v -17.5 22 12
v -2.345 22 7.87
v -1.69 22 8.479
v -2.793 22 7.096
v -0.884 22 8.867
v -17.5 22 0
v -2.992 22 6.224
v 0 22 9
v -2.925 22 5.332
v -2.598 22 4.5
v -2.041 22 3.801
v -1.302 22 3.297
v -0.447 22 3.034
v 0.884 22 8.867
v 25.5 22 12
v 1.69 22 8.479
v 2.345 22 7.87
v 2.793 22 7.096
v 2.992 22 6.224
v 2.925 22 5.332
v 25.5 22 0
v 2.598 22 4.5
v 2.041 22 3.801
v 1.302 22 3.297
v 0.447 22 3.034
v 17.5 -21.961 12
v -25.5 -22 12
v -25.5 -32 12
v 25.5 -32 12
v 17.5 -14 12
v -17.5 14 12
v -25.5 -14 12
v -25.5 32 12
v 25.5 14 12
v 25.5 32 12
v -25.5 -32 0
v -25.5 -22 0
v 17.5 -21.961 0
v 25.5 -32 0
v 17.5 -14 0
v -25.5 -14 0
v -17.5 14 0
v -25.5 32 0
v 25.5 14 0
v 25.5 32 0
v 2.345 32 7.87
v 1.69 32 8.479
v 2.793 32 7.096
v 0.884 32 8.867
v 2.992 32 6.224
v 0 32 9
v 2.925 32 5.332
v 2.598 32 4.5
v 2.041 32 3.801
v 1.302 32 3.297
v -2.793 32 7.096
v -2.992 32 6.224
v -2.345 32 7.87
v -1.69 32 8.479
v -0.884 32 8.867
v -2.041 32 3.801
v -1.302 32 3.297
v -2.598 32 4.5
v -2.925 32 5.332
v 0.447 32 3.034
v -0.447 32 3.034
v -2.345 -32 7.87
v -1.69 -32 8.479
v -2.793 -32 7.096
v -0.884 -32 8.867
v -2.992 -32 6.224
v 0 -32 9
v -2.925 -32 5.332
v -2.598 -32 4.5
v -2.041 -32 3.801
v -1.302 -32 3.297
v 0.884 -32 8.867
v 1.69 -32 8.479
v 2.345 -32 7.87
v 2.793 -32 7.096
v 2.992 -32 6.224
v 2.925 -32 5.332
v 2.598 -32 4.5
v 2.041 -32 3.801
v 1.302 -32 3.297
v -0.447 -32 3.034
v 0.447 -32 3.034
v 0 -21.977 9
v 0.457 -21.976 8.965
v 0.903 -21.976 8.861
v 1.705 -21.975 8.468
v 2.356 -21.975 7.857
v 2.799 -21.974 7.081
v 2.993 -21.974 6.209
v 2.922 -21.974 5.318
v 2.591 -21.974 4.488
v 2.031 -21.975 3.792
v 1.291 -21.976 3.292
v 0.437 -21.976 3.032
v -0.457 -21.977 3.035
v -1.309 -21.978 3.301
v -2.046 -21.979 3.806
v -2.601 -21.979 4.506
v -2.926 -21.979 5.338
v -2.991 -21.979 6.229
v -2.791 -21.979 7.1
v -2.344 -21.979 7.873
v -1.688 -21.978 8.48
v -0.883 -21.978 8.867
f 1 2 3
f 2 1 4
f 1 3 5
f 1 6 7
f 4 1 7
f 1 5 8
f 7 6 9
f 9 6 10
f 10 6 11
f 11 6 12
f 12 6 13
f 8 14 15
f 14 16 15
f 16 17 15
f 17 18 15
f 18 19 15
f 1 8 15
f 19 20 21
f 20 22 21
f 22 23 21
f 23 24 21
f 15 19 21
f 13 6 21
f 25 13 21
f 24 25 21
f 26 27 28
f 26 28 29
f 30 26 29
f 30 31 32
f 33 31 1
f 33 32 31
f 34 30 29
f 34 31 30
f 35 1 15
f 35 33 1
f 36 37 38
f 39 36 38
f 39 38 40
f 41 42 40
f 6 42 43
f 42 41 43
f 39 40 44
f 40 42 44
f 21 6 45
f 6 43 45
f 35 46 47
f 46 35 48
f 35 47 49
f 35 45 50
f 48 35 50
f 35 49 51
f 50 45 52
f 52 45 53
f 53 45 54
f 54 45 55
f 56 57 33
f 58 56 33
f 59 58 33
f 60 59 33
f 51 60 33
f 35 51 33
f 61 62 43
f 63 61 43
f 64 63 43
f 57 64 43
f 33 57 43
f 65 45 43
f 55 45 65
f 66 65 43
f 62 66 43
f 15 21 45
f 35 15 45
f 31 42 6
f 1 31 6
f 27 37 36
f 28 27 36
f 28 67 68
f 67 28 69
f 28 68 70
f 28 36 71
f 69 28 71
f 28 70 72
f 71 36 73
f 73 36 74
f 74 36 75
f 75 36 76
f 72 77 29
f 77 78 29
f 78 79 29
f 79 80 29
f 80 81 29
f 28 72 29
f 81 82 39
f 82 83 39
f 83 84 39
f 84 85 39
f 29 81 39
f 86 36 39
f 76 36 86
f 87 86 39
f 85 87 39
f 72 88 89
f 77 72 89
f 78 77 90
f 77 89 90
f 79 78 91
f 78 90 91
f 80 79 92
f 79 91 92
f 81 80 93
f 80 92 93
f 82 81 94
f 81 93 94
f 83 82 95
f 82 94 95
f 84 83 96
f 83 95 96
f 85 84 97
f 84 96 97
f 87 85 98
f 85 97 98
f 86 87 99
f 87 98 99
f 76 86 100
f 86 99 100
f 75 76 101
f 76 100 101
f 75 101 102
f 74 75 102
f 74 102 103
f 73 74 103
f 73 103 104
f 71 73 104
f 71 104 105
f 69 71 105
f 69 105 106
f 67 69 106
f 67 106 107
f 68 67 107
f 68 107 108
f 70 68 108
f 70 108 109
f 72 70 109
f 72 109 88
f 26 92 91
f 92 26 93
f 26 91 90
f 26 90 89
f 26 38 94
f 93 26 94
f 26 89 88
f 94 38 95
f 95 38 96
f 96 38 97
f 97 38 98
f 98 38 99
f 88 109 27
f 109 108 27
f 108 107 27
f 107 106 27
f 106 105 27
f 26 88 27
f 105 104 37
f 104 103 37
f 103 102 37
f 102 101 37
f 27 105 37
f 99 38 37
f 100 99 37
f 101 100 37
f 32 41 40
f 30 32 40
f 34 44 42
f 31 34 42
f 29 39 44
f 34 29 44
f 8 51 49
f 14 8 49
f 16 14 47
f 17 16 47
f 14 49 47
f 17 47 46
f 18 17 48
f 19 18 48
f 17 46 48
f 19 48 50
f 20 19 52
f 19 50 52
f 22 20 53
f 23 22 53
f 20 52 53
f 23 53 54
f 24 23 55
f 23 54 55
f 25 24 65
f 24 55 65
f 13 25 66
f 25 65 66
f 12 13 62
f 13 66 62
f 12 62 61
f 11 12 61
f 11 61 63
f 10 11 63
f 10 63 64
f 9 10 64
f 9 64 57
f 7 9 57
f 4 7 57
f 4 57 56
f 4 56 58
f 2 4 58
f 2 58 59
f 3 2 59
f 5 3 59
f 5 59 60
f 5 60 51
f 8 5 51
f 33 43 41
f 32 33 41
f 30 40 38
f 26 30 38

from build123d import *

# Parameters (mm, degrees)
DODANIE_WYCI_GNI_CIE1_DEPTH = 12
WYTNIJ_WYCI_GNI_CIE1_START  = 32
SZKIC2_R                    = 3
WYTNIJ_WYCI_GNI_CIE1_DEPTH  = 12
WYTNIJ_WYCI_GNI_CIE2_START  = -20
SZKIC2_2_R                  = 3
WYTNIJ_WYCI_GNI_CIE2_DEPTH  = 12


with BuildPart() as part:
    # Szkic1 → Dodanie-wyciągnięcie1 (new body)
    with BuildSketch(Plane.XY):
        Polygon((-25.5, -22), (-25.5, -32), (25.5, -32), (25.5, 14), (-17.5, 14), (-17.5, 22), (25.5, 22), (25.5, 32), (-25.5, 32), (-25.5, -14), (17.5, -14), (17.5, -21.960784314), align=None)
    extrude(amount=DODANIE_WYCI_GNI_CIE1_DEPTH)

    # Szkic2 → Wytnij-wyciągnięcie1 (cut)
    with BuildSketch(Plane(origin=(0, 0, 0), x_dir=(1, 0, 0), z_dir=(0, 1, 0)).offset(WYTNIJ_WYCI_GNI_CIE1_START)):
        with Locations(Location((0, -6, 0), (0, 0, 270))):
            Circle(SZKIC2_R)
    extrude(amount=-WYTNIJ_WYCI_GNI_CIE1_DEPTH, mode=Mode.SUBTRACT)

    # Szkic2<2> → Wytnij-wyciągnięcie2 (cut)
    with BuildSketch(Plane(origin=(0, 0, 0), x_dir=(1, 0, 0), z_dir=(0, 1, 0)).offset(WYTNIJ_WYCI_GNI_CIE2_START)):
        with Locations(Location((0, -6, 0), (0, 0, 270))):
            Circle(SZKIC2_2_R)
    extrude(amount=-WYTNIJ_WYCI_GNI_CIE2_DEPTH, mode=Mode.SUBTRACT)


solid = part.part
